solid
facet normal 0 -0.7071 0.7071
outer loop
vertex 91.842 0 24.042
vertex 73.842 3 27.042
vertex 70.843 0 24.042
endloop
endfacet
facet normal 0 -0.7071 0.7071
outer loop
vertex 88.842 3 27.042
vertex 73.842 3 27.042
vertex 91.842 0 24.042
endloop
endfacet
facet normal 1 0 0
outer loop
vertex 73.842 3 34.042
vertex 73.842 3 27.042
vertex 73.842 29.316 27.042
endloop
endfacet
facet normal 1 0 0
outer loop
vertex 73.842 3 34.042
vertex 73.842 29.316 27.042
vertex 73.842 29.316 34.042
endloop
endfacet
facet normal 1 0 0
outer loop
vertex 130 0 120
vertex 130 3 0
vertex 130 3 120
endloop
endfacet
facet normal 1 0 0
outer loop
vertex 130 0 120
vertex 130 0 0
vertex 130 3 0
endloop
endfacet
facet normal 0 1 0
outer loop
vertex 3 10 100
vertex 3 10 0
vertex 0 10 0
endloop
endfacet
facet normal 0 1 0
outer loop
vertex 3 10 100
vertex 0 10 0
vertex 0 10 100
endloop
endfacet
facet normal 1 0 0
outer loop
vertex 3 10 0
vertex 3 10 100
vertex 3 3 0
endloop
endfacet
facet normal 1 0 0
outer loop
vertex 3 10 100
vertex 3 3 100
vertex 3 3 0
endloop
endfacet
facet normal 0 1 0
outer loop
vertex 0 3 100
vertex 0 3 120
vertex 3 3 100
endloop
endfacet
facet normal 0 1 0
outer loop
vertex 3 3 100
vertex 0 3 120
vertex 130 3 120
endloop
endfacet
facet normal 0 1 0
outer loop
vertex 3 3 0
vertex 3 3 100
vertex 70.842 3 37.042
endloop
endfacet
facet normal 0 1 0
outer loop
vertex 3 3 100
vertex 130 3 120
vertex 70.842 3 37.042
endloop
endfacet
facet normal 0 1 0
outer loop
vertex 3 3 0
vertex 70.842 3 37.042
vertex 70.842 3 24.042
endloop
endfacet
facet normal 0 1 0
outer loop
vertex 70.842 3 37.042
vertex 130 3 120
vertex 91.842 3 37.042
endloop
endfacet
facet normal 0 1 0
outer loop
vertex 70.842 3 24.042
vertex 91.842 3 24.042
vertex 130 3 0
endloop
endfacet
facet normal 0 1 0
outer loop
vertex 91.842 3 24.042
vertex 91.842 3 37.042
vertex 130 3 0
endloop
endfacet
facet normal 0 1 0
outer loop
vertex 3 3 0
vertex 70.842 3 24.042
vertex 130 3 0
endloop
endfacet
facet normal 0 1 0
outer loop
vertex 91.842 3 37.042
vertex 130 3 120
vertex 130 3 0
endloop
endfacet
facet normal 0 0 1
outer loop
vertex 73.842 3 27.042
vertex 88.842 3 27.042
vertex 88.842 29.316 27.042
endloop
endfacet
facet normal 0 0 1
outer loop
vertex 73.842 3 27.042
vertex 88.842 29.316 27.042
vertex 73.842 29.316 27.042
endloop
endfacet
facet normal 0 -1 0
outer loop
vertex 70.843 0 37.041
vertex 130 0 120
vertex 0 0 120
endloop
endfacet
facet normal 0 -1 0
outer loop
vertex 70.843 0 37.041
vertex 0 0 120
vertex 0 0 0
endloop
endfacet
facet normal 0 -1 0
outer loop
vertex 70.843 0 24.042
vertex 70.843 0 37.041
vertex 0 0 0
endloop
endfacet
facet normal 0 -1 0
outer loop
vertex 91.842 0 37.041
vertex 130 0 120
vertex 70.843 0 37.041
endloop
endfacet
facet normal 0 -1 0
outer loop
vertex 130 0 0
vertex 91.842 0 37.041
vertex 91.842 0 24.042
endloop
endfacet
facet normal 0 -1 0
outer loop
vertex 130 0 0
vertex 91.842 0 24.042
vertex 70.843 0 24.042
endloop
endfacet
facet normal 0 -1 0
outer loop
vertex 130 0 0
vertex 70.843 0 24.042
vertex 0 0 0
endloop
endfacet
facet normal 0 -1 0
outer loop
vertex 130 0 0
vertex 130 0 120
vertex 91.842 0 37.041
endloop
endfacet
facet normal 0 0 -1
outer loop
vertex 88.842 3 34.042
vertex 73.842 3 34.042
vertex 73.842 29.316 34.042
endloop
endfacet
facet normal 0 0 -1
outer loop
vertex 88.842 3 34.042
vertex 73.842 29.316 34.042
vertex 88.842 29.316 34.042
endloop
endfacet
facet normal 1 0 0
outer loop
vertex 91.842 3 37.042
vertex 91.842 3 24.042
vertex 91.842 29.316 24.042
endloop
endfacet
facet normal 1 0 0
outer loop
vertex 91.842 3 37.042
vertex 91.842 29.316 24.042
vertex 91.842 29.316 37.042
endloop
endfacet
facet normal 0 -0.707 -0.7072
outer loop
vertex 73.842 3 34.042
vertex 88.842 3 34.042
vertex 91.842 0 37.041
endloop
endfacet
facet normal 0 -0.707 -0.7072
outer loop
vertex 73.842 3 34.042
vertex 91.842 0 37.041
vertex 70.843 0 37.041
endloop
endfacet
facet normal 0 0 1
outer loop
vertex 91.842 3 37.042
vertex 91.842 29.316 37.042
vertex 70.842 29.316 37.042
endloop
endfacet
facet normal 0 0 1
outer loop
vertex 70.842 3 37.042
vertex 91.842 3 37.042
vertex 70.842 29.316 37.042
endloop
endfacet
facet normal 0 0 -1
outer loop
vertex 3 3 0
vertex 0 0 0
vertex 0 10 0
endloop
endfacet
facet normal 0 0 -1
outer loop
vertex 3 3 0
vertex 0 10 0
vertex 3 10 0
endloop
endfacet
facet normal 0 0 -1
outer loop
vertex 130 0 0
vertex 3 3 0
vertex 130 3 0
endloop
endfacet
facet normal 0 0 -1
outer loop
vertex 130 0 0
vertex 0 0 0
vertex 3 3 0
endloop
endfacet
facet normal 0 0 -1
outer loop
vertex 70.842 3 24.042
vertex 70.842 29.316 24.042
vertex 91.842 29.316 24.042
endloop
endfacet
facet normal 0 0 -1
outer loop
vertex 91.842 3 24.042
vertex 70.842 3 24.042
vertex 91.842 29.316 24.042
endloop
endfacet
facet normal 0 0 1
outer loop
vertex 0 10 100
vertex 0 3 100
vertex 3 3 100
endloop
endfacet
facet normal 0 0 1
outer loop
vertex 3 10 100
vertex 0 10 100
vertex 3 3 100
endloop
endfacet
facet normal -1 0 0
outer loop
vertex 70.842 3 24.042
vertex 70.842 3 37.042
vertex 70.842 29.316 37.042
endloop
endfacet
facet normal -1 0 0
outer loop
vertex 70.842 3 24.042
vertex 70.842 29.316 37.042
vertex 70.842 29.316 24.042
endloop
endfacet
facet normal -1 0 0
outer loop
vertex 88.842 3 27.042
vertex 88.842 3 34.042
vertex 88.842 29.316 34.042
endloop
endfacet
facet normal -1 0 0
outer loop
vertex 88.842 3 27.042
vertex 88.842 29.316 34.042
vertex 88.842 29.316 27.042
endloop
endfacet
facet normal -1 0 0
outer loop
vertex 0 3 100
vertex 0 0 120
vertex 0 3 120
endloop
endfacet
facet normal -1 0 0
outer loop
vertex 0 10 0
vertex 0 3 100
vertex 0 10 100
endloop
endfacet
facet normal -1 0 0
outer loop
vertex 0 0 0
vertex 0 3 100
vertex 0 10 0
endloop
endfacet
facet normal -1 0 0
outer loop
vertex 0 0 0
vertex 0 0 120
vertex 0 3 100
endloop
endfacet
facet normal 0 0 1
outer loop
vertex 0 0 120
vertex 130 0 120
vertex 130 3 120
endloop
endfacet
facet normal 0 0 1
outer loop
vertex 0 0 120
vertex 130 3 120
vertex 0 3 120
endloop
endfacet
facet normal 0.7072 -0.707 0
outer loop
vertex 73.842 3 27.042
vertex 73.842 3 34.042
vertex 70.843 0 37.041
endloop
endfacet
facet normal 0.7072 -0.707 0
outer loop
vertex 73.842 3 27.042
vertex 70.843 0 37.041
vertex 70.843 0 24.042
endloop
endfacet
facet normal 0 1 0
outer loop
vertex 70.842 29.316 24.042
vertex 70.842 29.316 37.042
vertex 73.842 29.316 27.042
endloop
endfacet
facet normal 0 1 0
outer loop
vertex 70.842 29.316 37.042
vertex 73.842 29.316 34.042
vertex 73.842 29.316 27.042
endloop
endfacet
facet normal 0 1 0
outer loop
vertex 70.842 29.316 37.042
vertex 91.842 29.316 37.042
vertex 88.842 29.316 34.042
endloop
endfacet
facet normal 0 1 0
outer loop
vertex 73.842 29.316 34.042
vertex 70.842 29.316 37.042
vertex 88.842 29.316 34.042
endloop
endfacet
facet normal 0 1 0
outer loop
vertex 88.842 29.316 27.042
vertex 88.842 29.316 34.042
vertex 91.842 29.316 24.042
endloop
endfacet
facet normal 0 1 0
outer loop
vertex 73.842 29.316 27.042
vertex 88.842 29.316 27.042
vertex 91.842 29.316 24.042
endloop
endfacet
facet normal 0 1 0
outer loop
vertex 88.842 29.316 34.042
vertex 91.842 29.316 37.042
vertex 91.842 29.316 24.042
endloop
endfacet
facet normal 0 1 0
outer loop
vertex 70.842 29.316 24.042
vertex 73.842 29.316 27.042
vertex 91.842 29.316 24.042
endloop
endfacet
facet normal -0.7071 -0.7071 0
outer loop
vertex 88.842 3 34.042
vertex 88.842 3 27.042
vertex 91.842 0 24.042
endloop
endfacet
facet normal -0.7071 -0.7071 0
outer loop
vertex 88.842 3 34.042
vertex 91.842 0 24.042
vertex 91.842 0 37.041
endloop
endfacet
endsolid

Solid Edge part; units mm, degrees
sketch "Sketch1" plane through (0, 0, 0) normal (0, -1, 0) x (1, 0, 0)
  line L0 (130, 0) -> (130, 120)
  line L1 (130, 120) -> (0, 120)
  line L2 (0, 120) -> (0, 0)
  line L3 (0, 0) -> (130, 0)
extrude "Protrusion1" add sketch "Sketch1" against normal blind 3
sketch "Sketch2" plane through (66.405, 0, 60) normal (0, -1, 0) x (1, 0, 0)
  line L0 (22.4375, -32.9583) -> (7.4375, -32.9583)
  line L1 (7.4375, -32.9583) -> (7.4375, -25.9583)
  line L2 (7.4375, -25.9583) -> (22.4375, -25.9583)
  line L3 (22.4375, -25.9583) -> (22.4375, -32.9583)
extrude "Recorte_Extrudado_3" cut sketch "Sketch2" against normal blind 36.068
chamfer "Chanfro_1" distance 3 angle 45 4 edges at (81.3425, 0, 34.0417) (88.8425, 0, 30.5417) (81.3425, 0, 27.0417) (73.8425, 0, 30.5417)
sketch "Sketch3" plane through (67.905, 3, 60) normal (0, 1, 0) x (-1, 0, 0)
  line L0 (-2.9375, -35.9583) -> (-23.9375, -35.9583)
  line L1 (-23.9375, -35.9583) -> (-23.9375, -22.9583)
  line L2 (-23.9375, -22.9583) -> (-2.9375, -22.9583)
  line L3 (-2.9375, -22.9583) -> (-2.9375, -35.9583)
  line L4 (-5.9375, -32.9583) -> (-20.9375, -32.9583)
  line L5 (-20.9375, -32.9583) -> (-20.9375, -25.9583)
  line L6 (-20.9375, -25.9583) -> (-5.9375, -25.9583)
  line L7 (-5.9375, -25.9583) -> (-5.9375, -32.9583)
extrude "Protrusão_Extrudada_4" add sketch "Sketch3" along normal blind 26.3165
sketch "Sketch4" plane through (66.405, 3, 60) normal (0, 1, 0) x (-1, 0, 0)
  line L0 (66.405, -60) -> (66.405, 40)
  line L1 (66.405, 40) -> (63.405, 40)
  line L2 (63.405, 40) -> (63.405, -60)
  line L3 (63.405, -60) -> (66.405, -60)
extrude "Protrusão_Extrudada_6" add sketch "Sketch4" along normal blind 7
